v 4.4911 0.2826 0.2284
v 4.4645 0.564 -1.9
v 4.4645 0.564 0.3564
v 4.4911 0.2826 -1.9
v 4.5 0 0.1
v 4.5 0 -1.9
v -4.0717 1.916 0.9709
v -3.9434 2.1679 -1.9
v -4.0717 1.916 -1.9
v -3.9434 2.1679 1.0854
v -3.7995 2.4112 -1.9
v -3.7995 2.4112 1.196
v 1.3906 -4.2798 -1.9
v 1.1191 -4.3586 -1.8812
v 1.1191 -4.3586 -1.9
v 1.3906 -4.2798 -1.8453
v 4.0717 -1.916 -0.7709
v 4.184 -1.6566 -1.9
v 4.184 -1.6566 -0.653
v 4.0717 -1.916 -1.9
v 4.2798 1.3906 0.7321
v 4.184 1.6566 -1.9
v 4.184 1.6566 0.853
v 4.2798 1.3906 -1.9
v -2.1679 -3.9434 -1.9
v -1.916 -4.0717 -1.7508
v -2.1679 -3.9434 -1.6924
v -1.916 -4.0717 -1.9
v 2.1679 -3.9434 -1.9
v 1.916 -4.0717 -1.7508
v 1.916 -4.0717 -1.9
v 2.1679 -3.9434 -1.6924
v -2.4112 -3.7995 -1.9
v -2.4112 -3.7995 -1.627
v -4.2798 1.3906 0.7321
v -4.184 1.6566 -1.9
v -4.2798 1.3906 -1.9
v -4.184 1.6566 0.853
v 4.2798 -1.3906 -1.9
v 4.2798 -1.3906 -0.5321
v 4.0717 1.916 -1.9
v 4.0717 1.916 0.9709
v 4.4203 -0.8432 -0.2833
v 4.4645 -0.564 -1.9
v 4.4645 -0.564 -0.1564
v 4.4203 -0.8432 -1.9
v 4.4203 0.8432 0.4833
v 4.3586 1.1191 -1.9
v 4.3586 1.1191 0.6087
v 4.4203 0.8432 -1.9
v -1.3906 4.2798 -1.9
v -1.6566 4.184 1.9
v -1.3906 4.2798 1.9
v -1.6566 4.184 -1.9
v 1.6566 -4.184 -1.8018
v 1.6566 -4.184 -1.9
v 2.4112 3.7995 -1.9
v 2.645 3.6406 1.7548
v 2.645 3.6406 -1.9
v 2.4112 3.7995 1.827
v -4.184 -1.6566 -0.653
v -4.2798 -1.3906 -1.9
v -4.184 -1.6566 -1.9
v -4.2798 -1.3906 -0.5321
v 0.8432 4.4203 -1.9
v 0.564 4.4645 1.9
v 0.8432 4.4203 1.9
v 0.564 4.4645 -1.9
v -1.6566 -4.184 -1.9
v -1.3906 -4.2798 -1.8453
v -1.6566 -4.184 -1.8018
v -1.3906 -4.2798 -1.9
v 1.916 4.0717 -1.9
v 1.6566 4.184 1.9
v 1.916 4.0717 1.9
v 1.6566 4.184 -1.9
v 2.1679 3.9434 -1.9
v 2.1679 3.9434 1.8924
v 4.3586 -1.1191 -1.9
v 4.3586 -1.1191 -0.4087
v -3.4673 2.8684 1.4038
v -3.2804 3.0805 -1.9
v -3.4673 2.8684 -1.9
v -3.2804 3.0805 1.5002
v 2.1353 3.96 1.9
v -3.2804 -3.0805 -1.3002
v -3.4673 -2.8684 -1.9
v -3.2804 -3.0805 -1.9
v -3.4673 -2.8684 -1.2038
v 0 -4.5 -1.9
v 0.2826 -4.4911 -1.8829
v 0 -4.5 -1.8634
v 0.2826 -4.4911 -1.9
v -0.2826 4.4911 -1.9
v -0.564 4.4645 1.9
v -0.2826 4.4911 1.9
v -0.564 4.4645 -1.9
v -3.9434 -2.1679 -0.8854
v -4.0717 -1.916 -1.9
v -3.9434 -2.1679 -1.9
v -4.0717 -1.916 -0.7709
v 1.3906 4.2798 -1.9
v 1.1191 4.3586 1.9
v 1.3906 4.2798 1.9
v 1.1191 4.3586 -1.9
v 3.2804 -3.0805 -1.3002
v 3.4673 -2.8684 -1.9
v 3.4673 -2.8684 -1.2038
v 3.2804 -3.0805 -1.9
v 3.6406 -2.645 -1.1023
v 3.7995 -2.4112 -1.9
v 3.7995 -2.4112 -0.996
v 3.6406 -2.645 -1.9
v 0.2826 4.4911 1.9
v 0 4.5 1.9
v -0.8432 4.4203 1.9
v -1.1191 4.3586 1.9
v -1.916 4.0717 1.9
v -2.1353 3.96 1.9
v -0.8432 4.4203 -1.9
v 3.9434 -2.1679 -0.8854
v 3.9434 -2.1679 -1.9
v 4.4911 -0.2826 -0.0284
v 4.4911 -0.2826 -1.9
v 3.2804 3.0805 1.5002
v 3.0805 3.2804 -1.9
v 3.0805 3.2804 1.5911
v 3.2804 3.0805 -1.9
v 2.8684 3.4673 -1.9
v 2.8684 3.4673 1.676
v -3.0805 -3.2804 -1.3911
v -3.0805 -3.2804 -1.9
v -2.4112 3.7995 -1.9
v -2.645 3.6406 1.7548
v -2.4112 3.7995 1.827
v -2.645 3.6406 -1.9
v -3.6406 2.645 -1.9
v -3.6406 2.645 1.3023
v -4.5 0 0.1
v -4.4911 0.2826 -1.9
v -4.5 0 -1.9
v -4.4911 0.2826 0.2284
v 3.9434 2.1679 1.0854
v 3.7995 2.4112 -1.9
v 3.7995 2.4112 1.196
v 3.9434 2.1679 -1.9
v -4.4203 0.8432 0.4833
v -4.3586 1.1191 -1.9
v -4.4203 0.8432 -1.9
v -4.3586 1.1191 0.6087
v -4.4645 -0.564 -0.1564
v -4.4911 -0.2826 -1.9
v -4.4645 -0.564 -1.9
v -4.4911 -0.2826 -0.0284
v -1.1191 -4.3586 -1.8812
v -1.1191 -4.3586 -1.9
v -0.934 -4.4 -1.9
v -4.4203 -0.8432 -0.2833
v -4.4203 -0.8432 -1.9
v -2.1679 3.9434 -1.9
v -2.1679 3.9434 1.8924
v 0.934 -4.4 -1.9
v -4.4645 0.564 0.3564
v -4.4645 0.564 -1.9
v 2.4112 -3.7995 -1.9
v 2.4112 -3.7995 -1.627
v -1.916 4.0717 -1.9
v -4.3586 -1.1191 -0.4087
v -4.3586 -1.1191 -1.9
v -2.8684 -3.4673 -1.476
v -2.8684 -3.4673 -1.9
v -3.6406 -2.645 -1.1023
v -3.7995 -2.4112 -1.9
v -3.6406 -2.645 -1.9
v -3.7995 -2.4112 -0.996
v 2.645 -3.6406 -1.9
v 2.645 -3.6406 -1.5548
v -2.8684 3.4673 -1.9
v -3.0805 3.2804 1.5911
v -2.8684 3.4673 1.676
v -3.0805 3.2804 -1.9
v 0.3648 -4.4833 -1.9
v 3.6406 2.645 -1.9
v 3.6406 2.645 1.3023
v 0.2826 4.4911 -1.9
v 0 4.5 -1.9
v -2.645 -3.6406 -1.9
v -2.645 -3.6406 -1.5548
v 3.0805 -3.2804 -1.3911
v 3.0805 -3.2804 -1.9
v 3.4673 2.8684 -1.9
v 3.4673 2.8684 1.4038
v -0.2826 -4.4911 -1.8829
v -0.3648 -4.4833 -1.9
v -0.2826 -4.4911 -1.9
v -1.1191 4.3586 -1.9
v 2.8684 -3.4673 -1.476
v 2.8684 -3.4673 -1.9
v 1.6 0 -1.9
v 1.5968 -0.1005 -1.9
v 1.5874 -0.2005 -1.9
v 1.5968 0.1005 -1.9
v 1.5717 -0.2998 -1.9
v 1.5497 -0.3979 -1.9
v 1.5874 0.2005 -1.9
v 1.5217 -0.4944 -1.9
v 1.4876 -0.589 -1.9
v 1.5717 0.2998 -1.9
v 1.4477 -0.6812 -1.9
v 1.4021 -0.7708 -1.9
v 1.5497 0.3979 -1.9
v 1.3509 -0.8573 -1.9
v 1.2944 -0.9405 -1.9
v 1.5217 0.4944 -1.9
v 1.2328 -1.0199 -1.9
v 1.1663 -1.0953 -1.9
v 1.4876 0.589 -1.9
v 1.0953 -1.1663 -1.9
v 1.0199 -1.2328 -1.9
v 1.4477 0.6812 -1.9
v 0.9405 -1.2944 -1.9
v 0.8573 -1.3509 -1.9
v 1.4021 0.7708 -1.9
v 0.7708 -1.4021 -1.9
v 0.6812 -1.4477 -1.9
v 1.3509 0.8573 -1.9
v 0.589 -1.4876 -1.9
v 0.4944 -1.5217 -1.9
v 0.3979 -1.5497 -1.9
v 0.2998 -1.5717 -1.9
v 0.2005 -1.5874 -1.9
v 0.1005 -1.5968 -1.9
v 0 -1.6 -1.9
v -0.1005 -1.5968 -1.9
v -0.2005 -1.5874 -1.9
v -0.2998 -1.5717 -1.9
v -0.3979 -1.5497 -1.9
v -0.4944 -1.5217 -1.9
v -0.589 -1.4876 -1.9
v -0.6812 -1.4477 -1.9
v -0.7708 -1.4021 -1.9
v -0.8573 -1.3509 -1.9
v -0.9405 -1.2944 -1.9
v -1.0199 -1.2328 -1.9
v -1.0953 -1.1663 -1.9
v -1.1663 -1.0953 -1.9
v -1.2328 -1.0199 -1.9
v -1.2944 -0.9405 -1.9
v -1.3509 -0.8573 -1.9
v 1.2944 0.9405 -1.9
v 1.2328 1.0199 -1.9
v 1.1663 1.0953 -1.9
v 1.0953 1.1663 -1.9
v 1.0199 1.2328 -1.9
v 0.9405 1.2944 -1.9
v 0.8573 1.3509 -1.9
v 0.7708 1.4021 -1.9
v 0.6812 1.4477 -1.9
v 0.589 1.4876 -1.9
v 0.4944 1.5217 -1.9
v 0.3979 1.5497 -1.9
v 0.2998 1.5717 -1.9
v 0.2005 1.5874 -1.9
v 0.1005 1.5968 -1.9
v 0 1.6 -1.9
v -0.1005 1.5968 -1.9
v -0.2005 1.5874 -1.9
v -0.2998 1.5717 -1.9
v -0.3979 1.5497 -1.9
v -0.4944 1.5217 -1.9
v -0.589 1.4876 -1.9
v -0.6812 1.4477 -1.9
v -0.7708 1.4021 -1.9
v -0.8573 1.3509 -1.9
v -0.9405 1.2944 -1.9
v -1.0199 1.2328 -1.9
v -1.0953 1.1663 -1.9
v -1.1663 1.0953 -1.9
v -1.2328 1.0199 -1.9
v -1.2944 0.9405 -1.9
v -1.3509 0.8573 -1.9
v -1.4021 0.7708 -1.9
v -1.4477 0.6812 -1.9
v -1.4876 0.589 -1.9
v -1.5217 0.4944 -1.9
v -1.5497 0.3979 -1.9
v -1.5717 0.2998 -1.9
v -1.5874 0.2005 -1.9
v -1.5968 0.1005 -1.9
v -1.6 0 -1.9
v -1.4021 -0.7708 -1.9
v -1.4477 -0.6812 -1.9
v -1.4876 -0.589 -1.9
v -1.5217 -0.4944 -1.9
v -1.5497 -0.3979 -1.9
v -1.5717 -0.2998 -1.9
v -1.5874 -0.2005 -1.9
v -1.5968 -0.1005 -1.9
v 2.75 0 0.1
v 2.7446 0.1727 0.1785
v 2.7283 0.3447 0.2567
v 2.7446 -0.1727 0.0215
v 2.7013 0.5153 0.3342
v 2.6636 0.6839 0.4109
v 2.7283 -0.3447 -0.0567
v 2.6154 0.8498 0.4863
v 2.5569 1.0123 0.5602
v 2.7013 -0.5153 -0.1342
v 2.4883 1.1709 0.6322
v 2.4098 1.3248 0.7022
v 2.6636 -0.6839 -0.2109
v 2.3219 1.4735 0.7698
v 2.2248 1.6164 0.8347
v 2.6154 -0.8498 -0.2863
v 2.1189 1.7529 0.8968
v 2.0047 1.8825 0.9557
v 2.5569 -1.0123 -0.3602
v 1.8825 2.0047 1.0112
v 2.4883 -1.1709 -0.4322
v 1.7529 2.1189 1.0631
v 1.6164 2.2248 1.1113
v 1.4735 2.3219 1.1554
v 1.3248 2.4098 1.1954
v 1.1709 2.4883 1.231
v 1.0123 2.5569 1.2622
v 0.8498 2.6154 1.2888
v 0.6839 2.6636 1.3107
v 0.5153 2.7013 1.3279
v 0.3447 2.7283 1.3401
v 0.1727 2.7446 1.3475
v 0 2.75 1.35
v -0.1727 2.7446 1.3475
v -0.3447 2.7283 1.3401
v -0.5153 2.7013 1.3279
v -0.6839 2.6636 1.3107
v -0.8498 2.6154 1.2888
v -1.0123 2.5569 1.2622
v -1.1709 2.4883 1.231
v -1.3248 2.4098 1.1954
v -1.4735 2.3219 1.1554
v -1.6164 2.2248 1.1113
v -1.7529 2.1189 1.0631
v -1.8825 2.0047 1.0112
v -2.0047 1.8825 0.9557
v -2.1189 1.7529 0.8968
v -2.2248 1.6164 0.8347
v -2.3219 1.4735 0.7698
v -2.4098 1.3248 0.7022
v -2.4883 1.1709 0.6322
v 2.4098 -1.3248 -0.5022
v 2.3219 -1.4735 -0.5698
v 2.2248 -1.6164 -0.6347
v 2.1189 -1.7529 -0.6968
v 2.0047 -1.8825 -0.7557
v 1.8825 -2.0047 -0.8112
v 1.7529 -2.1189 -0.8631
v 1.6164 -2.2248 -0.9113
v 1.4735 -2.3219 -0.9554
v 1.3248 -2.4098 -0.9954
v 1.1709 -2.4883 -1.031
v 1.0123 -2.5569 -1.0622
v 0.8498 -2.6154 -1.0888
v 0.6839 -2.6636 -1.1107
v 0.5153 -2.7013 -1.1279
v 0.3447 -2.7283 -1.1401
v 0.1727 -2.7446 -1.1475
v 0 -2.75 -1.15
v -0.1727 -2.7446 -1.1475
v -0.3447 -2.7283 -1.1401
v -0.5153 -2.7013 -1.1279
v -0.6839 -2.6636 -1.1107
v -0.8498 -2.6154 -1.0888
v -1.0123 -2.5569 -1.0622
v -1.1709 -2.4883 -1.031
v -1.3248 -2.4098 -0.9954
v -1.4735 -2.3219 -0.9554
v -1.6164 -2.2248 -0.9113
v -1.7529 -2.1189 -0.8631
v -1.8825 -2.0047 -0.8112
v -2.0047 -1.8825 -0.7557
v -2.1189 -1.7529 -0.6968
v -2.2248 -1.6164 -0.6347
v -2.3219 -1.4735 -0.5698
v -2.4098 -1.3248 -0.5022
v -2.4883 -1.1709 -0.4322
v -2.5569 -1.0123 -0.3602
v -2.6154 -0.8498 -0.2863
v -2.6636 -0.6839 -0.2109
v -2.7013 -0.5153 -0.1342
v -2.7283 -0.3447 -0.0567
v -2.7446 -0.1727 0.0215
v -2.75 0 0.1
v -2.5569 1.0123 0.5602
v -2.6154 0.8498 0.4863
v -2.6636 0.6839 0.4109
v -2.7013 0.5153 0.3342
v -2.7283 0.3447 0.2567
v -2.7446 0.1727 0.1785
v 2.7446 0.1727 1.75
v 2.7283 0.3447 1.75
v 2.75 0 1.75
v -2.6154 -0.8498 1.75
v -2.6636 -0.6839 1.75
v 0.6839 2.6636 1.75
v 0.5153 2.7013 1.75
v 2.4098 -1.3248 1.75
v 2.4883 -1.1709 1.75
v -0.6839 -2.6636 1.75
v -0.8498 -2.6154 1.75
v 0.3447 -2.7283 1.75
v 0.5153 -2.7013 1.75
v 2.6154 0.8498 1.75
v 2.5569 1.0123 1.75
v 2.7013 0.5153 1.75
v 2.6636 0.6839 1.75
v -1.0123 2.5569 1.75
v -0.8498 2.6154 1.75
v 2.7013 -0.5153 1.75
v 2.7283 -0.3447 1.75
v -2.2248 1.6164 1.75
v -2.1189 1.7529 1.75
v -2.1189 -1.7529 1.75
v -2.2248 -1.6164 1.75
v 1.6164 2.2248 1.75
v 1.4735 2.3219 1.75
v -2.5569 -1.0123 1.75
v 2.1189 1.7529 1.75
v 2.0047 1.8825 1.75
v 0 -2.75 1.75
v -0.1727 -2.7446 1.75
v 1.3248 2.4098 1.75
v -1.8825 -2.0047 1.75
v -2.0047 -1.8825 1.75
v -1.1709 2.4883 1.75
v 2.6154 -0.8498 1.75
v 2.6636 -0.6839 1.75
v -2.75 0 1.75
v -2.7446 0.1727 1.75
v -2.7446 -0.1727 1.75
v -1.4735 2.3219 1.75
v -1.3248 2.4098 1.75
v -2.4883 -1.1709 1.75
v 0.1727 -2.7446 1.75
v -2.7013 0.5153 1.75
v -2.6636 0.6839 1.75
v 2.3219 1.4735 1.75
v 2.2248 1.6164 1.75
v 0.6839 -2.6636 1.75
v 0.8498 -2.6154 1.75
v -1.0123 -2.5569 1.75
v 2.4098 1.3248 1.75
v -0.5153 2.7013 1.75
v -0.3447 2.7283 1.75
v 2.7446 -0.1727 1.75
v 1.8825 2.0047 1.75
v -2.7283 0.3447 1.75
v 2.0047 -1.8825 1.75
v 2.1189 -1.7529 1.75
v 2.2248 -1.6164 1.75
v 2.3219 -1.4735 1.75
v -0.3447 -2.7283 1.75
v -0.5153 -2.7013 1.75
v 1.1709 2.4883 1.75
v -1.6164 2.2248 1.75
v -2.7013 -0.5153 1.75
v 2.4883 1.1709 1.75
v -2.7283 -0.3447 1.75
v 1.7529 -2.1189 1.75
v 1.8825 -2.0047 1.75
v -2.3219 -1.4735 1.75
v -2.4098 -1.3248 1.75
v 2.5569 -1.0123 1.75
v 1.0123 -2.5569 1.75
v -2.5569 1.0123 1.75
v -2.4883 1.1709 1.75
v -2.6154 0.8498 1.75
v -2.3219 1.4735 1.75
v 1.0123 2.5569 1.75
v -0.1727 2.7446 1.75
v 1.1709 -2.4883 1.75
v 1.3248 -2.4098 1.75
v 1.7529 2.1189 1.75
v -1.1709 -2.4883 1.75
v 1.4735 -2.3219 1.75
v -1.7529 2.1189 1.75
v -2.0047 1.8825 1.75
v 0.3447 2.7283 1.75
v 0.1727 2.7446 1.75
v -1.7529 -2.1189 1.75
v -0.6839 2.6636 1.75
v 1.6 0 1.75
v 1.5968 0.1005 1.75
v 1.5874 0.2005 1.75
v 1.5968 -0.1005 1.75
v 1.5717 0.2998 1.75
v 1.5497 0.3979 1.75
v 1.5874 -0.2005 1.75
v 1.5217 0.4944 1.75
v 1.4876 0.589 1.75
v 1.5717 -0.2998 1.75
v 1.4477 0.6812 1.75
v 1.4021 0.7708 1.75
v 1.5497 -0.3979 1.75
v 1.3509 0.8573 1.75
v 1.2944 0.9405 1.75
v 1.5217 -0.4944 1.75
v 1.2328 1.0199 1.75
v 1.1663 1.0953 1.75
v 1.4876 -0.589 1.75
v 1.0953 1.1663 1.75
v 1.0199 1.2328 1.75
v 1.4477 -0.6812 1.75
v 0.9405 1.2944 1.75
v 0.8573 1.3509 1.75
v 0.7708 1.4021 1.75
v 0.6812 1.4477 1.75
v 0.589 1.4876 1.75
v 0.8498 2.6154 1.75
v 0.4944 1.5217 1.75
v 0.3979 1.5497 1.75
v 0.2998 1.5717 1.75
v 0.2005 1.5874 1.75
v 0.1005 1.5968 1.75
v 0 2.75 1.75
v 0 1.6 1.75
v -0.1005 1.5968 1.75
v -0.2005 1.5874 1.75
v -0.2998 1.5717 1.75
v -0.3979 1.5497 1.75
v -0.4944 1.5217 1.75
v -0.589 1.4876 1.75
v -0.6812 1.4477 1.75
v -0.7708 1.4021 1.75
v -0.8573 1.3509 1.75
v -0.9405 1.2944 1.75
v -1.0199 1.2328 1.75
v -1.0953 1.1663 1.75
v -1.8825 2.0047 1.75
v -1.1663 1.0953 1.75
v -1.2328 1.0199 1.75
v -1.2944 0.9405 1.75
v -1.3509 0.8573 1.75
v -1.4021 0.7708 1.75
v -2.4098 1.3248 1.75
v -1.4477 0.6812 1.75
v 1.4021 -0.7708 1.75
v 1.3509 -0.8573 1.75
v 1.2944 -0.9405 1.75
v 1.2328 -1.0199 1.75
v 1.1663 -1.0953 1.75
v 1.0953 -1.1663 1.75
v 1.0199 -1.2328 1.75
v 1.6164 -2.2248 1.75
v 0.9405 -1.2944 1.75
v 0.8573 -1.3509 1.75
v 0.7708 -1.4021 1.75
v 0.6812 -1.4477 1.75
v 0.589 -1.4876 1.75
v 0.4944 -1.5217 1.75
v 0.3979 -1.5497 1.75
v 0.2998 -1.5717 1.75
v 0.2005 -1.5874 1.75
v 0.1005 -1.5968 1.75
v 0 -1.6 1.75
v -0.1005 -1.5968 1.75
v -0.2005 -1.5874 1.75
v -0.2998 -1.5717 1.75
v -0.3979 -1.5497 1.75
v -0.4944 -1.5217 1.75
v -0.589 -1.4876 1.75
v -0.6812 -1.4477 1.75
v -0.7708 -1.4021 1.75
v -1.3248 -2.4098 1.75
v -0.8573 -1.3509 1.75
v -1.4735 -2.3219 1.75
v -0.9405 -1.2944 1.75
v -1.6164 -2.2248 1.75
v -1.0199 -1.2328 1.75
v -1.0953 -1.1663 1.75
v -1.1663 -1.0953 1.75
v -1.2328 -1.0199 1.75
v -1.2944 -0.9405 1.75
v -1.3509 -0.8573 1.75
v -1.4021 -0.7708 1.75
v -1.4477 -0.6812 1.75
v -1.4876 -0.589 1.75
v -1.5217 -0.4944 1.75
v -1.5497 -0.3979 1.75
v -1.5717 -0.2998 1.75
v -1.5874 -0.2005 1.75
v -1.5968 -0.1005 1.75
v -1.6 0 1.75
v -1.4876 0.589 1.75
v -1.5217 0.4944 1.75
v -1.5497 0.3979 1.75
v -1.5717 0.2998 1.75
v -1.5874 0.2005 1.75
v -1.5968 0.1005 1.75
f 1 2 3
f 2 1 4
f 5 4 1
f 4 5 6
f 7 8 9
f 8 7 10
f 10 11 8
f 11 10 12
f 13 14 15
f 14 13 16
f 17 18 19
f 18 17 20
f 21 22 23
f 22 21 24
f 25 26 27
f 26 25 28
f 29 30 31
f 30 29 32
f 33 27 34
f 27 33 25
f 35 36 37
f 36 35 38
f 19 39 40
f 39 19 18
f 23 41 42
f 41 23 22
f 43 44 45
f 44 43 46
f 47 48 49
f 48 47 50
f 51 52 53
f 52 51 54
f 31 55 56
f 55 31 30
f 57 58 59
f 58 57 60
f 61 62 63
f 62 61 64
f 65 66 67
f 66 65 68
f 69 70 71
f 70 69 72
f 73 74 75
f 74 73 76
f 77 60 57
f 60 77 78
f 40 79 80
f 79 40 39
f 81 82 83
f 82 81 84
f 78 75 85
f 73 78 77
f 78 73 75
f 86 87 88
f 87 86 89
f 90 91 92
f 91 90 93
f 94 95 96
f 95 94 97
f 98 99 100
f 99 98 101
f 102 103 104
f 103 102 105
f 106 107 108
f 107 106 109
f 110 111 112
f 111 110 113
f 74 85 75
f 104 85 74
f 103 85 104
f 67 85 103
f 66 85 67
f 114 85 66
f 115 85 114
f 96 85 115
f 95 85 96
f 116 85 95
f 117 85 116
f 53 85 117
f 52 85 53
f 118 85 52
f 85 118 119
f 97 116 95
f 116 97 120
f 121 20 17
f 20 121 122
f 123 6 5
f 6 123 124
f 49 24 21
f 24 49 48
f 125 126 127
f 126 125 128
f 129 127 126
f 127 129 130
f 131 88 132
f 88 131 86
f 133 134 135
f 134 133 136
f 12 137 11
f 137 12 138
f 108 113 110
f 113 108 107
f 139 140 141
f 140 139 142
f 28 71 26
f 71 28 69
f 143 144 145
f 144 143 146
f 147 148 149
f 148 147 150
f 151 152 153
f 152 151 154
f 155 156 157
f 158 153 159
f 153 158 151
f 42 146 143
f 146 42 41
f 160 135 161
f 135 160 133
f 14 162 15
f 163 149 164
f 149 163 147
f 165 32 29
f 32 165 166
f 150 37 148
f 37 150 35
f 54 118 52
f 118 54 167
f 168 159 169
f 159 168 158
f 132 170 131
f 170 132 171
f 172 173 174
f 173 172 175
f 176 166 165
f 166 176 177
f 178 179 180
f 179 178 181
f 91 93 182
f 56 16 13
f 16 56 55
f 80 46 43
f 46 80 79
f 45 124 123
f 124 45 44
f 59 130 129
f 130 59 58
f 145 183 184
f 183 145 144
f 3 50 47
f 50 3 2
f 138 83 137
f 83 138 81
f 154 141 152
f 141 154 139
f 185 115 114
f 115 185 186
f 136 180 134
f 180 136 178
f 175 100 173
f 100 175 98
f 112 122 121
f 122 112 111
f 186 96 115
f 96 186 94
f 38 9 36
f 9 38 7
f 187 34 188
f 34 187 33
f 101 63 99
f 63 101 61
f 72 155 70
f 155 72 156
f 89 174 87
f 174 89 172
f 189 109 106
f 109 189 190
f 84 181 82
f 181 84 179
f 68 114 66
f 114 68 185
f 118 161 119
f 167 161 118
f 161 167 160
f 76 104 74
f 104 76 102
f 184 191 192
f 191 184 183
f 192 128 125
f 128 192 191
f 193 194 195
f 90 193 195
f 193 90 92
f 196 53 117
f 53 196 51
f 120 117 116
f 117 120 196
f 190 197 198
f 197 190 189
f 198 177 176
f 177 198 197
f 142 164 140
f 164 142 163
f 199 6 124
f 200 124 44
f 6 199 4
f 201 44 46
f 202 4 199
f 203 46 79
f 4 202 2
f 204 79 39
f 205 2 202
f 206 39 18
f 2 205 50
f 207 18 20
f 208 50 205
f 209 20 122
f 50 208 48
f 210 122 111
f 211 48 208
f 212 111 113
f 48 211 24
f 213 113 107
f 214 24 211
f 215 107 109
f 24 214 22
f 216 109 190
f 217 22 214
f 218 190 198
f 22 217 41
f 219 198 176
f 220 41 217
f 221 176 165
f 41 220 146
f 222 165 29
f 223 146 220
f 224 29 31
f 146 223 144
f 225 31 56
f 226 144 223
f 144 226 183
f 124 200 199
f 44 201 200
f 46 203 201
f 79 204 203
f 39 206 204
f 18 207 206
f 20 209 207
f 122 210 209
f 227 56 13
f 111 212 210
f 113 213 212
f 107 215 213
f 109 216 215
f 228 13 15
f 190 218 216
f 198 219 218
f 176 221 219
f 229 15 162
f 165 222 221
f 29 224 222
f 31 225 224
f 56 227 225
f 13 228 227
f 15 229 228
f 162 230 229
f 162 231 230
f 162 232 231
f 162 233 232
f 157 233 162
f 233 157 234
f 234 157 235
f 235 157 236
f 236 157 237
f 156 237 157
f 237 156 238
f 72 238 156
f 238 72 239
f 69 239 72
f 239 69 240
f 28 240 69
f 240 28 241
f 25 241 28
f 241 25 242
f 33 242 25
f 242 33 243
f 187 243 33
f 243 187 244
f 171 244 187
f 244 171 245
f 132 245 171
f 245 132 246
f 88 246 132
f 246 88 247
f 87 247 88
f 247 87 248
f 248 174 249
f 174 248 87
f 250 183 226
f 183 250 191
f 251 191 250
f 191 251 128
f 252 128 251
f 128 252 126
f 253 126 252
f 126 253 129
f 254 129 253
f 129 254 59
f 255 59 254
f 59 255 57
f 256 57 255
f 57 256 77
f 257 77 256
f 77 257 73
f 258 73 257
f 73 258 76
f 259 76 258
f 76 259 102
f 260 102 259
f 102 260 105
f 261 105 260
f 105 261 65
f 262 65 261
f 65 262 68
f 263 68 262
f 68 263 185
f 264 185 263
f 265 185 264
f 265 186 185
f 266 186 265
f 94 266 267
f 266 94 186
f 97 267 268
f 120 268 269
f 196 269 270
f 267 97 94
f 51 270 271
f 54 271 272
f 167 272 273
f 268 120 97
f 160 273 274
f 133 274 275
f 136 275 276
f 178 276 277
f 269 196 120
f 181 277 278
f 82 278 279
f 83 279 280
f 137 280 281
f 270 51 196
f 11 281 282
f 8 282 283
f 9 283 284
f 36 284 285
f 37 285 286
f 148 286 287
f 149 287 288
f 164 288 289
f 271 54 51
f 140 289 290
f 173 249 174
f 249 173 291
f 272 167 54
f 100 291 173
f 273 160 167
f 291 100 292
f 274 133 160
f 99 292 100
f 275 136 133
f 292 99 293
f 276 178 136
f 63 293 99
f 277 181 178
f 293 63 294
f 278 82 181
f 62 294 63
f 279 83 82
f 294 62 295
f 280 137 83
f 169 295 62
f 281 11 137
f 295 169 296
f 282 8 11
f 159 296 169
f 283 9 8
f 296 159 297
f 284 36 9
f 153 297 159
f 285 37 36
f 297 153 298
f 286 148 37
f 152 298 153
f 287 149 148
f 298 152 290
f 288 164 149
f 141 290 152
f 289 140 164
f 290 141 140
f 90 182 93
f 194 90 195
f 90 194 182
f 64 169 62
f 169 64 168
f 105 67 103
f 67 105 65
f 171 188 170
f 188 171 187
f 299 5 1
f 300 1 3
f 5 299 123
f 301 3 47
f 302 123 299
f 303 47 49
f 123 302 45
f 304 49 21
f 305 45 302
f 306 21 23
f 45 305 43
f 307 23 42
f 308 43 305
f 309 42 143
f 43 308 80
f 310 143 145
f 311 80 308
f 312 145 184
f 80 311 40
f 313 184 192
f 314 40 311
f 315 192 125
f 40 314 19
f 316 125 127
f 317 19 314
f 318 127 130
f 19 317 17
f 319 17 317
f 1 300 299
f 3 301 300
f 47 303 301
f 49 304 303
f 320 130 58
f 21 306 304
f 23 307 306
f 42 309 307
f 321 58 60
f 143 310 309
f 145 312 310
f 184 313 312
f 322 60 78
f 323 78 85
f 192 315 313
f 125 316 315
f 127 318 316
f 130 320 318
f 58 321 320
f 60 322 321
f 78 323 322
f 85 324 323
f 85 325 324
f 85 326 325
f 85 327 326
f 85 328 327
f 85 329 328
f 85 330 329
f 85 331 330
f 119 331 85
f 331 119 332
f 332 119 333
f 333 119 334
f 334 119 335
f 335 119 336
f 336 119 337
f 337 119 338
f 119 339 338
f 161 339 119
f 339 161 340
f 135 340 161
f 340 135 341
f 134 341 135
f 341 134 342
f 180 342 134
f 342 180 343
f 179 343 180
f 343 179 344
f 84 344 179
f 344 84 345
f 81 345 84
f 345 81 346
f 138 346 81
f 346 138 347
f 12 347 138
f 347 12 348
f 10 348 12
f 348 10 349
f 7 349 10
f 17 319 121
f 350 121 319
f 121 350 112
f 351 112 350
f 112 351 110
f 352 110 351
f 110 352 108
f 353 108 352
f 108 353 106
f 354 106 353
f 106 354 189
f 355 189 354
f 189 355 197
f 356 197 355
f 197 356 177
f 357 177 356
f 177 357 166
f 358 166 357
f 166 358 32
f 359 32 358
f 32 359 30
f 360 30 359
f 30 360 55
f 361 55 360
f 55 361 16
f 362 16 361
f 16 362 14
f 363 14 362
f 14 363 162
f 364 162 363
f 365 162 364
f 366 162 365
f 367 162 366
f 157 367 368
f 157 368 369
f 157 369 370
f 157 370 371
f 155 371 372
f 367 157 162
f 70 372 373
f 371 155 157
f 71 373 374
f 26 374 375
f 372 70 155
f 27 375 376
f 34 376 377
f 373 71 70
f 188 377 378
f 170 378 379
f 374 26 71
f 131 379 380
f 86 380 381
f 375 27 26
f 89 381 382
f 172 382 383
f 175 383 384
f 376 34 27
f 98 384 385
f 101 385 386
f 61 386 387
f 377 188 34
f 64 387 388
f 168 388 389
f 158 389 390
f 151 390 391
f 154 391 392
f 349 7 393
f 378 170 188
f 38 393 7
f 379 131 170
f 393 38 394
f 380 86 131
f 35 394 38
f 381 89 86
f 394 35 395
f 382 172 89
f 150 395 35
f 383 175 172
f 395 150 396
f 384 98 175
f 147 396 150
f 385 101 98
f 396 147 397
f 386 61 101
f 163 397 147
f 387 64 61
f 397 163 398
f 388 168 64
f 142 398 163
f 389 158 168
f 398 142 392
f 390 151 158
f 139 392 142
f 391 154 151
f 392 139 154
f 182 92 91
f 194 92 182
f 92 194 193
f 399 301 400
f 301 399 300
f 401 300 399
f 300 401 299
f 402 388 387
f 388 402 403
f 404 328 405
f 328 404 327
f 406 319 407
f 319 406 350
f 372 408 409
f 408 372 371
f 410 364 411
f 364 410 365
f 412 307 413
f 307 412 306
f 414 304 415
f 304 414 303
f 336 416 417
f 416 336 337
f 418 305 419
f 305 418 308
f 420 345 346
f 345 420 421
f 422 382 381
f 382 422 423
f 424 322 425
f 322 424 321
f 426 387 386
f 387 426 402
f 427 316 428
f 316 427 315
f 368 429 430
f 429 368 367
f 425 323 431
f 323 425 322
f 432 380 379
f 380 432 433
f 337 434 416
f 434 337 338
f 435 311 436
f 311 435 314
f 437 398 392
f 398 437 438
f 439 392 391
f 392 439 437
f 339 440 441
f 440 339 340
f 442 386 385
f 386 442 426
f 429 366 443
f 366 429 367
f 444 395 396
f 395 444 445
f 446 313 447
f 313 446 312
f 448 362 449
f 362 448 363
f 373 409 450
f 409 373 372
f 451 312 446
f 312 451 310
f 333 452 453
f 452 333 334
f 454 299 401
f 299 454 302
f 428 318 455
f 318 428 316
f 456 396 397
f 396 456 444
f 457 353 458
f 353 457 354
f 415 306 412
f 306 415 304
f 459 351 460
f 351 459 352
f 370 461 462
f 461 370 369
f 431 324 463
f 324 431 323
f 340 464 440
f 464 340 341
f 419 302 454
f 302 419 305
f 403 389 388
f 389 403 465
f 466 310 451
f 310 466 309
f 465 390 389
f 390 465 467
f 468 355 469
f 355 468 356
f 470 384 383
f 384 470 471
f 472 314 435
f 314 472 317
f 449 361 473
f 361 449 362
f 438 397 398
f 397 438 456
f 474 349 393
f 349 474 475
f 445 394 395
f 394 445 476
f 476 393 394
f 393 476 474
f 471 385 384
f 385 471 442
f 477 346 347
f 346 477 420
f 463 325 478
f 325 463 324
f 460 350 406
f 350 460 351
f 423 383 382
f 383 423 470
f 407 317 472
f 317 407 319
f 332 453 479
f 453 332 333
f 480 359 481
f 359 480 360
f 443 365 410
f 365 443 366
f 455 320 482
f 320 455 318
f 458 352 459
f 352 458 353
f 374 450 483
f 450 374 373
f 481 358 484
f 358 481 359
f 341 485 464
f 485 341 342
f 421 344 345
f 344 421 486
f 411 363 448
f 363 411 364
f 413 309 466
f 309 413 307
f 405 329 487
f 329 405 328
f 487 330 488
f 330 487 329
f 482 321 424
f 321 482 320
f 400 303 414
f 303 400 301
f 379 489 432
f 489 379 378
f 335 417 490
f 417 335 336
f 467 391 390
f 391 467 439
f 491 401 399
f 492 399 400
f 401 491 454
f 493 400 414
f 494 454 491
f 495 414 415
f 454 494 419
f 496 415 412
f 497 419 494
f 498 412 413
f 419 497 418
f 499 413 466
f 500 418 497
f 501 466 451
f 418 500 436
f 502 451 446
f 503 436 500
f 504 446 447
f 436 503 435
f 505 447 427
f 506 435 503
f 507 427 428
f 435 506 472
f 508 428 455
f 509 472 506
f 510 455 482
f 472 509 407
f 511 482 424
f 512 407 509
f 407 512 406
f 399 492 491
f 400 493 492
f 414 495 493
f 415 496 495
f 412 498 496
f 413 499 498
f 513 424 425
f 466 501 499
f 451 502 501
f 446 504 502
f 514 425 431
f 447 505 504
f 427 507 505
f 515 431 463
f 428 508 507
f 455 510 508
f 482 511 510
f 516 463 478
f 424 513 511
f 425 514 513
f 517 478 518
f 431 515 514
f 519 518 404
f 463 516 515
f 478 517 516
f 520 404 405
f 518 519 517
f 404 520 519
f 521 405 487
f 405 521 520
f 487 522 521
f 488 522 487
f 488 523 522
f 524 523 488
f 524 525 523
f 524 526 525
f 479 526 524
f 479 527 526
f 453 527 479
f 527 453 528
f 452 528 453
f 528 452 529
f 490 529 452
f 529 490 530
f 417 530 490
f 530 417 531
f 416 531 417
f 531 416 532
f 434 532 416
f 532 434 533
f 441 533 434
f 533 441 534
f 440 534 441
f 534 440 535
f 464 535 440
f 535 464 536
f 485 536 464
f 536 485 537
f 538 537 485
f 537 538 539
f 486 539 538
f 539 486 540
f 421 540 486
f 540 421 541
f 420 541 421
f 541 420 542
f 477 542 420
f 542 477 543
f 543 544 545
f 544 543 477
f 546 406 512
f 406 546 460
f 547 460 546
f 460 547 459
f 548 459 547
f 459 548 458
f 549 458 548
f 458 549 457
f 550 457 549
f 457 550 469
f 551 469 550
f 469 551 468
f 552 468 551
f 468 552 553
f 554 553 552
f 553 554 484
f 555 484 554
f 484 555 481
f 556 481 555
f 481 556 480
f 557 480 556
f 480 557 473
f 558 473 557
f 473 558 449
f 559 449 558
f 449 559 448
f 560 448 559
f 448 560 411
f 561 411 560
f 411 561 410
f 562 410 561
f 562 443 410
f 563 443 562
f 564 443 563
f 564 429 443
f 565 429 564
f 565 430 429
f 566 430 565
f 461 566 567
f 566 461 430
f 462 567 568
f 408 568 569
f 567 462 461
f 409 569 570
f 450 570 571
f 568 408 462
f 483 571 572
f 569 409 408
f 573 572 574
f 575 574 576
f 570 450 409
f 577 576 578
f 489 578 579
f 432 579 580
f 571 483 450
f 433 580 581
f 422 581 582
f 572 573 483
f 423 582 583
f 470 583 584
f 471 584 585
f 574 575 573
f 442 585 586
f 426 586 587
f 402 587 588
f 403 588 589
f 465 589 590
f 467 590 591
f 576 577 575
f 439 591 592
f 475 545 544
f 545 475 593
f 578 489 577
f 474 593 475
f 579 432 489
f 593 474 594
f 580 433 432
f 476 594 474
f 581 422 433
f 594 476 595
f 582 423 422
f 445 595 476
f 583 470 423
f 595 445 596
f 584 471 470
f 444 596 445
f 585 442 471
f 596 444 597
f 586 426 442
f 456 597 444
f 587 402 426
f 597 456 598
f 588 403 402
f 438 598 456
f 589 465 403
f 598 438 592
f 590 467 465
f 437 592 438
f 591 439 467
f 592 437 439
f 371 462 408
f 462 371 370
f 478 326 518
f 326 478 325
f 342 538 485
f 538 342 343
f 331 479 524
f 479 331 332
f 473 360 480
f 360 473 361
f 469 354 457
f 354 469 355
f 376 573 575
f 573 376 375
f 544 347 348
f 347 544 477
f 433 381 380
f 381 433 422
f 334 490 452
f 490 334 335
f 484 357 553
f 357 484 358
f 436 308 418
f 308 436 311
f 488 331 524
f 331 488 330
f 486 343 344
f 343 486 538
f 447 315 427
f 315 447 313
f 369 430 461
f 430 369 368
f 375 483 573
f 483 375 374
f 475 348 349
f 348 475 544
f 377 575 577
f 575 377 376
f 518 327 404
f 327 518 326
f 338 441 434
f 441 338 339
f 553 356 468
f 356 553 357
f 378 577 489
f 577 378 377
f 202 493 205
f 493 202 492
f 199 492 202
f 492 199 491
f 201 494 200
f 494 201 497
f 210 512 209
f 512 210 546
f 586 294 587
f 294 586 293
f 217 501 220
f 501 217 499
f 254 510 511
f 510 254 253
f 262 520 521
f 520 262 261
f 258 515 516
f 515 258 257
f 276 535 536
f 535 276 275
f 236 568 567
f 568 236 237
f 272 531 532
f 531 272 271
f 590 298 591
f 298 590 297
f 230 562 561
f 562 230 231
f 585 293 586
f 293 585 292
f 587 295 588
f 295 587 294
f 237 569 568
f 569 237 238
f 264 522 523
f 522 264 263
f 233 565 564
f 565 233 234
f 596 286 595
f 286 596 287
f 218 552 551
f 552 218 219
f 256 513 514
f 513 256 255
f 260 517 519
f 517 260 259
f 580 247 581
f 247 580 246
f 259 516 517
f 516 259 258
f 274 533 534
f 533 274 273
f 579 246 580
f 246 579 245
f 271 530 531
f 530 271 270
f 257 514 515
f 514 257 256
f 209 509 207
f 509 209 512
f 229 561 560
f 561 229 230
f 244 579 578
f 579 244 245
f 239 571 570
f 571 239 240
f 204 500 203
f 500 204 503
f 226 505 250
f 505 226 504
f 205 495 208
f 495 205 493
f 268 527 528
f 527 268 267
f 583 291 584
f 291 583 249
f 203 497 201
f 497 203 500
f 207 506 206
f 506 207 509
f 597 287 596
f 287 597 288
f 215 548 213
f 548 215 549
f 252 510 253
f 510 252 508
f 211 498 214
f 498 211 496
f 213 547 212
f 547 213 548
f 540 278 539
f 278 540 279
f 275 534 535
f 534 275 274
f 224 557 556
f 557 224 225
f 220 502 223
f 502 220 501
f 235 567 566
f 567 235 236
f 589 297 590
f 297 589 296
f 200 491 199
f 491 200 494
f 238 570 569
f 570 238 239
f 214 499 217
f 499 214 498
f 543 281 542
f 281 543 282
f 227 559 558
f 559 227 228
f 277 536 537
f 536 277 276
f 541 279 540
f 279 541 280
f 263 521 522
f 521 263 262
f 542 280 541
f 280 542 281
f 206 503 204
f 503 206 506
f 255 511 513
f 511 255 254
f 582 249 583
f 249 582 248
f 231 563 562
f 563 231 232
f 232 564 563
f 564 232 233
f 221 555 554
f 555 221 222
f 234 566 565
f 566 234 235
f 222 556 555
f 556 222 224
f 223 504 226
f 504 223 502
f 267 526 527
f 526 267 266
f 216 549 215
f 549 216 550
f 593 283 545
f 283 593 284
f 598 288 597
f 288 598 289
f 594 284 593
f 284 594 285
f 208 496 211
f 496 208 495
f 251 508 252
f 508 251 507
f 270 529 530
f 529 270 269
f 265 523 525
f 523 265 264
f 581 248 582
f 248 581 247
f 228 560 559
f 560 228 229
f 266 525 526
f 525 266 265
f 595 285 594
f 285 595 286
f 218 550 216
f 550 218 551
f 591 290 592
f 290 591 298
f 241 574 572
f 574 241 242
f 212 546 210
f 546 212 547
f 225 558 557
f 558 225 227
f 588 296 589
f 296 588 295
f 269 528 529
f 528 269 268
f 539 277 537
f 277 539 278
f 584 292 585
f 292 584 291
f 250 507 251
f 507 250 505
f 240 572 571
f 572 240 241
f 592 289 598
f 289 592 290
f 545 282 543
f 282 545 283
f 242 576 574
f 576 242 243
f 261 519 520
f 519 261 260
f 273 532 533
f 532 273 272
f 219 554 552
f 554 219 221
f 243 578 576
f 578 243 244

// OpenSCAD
$fn = 100;
//2.5 schief auf 5.5
angle = atan (2.5 / 5.5);
echo (angle);
echo (cos (angle));

module slantcyl (r, h, angle, up)
{
    e = 0.1;
    mov = (2 * r / cos (angle) + e) * (up ? 1 : -1);
    difference () {
        cylinder (r = r, h = h, center = true);
        translate ([0, 0, mov])
            rotate ([angle, 0, 0])
                cube (4 * r, center = true);
    }
}

difference () {
    union () {
        slantcyl (4.5, 3.8, angle, true);
        slantcyl (5.5 / 2, 3.5, angle, false);
    }
    cylinder (r = 1.6, h = 7, center = true);
}
